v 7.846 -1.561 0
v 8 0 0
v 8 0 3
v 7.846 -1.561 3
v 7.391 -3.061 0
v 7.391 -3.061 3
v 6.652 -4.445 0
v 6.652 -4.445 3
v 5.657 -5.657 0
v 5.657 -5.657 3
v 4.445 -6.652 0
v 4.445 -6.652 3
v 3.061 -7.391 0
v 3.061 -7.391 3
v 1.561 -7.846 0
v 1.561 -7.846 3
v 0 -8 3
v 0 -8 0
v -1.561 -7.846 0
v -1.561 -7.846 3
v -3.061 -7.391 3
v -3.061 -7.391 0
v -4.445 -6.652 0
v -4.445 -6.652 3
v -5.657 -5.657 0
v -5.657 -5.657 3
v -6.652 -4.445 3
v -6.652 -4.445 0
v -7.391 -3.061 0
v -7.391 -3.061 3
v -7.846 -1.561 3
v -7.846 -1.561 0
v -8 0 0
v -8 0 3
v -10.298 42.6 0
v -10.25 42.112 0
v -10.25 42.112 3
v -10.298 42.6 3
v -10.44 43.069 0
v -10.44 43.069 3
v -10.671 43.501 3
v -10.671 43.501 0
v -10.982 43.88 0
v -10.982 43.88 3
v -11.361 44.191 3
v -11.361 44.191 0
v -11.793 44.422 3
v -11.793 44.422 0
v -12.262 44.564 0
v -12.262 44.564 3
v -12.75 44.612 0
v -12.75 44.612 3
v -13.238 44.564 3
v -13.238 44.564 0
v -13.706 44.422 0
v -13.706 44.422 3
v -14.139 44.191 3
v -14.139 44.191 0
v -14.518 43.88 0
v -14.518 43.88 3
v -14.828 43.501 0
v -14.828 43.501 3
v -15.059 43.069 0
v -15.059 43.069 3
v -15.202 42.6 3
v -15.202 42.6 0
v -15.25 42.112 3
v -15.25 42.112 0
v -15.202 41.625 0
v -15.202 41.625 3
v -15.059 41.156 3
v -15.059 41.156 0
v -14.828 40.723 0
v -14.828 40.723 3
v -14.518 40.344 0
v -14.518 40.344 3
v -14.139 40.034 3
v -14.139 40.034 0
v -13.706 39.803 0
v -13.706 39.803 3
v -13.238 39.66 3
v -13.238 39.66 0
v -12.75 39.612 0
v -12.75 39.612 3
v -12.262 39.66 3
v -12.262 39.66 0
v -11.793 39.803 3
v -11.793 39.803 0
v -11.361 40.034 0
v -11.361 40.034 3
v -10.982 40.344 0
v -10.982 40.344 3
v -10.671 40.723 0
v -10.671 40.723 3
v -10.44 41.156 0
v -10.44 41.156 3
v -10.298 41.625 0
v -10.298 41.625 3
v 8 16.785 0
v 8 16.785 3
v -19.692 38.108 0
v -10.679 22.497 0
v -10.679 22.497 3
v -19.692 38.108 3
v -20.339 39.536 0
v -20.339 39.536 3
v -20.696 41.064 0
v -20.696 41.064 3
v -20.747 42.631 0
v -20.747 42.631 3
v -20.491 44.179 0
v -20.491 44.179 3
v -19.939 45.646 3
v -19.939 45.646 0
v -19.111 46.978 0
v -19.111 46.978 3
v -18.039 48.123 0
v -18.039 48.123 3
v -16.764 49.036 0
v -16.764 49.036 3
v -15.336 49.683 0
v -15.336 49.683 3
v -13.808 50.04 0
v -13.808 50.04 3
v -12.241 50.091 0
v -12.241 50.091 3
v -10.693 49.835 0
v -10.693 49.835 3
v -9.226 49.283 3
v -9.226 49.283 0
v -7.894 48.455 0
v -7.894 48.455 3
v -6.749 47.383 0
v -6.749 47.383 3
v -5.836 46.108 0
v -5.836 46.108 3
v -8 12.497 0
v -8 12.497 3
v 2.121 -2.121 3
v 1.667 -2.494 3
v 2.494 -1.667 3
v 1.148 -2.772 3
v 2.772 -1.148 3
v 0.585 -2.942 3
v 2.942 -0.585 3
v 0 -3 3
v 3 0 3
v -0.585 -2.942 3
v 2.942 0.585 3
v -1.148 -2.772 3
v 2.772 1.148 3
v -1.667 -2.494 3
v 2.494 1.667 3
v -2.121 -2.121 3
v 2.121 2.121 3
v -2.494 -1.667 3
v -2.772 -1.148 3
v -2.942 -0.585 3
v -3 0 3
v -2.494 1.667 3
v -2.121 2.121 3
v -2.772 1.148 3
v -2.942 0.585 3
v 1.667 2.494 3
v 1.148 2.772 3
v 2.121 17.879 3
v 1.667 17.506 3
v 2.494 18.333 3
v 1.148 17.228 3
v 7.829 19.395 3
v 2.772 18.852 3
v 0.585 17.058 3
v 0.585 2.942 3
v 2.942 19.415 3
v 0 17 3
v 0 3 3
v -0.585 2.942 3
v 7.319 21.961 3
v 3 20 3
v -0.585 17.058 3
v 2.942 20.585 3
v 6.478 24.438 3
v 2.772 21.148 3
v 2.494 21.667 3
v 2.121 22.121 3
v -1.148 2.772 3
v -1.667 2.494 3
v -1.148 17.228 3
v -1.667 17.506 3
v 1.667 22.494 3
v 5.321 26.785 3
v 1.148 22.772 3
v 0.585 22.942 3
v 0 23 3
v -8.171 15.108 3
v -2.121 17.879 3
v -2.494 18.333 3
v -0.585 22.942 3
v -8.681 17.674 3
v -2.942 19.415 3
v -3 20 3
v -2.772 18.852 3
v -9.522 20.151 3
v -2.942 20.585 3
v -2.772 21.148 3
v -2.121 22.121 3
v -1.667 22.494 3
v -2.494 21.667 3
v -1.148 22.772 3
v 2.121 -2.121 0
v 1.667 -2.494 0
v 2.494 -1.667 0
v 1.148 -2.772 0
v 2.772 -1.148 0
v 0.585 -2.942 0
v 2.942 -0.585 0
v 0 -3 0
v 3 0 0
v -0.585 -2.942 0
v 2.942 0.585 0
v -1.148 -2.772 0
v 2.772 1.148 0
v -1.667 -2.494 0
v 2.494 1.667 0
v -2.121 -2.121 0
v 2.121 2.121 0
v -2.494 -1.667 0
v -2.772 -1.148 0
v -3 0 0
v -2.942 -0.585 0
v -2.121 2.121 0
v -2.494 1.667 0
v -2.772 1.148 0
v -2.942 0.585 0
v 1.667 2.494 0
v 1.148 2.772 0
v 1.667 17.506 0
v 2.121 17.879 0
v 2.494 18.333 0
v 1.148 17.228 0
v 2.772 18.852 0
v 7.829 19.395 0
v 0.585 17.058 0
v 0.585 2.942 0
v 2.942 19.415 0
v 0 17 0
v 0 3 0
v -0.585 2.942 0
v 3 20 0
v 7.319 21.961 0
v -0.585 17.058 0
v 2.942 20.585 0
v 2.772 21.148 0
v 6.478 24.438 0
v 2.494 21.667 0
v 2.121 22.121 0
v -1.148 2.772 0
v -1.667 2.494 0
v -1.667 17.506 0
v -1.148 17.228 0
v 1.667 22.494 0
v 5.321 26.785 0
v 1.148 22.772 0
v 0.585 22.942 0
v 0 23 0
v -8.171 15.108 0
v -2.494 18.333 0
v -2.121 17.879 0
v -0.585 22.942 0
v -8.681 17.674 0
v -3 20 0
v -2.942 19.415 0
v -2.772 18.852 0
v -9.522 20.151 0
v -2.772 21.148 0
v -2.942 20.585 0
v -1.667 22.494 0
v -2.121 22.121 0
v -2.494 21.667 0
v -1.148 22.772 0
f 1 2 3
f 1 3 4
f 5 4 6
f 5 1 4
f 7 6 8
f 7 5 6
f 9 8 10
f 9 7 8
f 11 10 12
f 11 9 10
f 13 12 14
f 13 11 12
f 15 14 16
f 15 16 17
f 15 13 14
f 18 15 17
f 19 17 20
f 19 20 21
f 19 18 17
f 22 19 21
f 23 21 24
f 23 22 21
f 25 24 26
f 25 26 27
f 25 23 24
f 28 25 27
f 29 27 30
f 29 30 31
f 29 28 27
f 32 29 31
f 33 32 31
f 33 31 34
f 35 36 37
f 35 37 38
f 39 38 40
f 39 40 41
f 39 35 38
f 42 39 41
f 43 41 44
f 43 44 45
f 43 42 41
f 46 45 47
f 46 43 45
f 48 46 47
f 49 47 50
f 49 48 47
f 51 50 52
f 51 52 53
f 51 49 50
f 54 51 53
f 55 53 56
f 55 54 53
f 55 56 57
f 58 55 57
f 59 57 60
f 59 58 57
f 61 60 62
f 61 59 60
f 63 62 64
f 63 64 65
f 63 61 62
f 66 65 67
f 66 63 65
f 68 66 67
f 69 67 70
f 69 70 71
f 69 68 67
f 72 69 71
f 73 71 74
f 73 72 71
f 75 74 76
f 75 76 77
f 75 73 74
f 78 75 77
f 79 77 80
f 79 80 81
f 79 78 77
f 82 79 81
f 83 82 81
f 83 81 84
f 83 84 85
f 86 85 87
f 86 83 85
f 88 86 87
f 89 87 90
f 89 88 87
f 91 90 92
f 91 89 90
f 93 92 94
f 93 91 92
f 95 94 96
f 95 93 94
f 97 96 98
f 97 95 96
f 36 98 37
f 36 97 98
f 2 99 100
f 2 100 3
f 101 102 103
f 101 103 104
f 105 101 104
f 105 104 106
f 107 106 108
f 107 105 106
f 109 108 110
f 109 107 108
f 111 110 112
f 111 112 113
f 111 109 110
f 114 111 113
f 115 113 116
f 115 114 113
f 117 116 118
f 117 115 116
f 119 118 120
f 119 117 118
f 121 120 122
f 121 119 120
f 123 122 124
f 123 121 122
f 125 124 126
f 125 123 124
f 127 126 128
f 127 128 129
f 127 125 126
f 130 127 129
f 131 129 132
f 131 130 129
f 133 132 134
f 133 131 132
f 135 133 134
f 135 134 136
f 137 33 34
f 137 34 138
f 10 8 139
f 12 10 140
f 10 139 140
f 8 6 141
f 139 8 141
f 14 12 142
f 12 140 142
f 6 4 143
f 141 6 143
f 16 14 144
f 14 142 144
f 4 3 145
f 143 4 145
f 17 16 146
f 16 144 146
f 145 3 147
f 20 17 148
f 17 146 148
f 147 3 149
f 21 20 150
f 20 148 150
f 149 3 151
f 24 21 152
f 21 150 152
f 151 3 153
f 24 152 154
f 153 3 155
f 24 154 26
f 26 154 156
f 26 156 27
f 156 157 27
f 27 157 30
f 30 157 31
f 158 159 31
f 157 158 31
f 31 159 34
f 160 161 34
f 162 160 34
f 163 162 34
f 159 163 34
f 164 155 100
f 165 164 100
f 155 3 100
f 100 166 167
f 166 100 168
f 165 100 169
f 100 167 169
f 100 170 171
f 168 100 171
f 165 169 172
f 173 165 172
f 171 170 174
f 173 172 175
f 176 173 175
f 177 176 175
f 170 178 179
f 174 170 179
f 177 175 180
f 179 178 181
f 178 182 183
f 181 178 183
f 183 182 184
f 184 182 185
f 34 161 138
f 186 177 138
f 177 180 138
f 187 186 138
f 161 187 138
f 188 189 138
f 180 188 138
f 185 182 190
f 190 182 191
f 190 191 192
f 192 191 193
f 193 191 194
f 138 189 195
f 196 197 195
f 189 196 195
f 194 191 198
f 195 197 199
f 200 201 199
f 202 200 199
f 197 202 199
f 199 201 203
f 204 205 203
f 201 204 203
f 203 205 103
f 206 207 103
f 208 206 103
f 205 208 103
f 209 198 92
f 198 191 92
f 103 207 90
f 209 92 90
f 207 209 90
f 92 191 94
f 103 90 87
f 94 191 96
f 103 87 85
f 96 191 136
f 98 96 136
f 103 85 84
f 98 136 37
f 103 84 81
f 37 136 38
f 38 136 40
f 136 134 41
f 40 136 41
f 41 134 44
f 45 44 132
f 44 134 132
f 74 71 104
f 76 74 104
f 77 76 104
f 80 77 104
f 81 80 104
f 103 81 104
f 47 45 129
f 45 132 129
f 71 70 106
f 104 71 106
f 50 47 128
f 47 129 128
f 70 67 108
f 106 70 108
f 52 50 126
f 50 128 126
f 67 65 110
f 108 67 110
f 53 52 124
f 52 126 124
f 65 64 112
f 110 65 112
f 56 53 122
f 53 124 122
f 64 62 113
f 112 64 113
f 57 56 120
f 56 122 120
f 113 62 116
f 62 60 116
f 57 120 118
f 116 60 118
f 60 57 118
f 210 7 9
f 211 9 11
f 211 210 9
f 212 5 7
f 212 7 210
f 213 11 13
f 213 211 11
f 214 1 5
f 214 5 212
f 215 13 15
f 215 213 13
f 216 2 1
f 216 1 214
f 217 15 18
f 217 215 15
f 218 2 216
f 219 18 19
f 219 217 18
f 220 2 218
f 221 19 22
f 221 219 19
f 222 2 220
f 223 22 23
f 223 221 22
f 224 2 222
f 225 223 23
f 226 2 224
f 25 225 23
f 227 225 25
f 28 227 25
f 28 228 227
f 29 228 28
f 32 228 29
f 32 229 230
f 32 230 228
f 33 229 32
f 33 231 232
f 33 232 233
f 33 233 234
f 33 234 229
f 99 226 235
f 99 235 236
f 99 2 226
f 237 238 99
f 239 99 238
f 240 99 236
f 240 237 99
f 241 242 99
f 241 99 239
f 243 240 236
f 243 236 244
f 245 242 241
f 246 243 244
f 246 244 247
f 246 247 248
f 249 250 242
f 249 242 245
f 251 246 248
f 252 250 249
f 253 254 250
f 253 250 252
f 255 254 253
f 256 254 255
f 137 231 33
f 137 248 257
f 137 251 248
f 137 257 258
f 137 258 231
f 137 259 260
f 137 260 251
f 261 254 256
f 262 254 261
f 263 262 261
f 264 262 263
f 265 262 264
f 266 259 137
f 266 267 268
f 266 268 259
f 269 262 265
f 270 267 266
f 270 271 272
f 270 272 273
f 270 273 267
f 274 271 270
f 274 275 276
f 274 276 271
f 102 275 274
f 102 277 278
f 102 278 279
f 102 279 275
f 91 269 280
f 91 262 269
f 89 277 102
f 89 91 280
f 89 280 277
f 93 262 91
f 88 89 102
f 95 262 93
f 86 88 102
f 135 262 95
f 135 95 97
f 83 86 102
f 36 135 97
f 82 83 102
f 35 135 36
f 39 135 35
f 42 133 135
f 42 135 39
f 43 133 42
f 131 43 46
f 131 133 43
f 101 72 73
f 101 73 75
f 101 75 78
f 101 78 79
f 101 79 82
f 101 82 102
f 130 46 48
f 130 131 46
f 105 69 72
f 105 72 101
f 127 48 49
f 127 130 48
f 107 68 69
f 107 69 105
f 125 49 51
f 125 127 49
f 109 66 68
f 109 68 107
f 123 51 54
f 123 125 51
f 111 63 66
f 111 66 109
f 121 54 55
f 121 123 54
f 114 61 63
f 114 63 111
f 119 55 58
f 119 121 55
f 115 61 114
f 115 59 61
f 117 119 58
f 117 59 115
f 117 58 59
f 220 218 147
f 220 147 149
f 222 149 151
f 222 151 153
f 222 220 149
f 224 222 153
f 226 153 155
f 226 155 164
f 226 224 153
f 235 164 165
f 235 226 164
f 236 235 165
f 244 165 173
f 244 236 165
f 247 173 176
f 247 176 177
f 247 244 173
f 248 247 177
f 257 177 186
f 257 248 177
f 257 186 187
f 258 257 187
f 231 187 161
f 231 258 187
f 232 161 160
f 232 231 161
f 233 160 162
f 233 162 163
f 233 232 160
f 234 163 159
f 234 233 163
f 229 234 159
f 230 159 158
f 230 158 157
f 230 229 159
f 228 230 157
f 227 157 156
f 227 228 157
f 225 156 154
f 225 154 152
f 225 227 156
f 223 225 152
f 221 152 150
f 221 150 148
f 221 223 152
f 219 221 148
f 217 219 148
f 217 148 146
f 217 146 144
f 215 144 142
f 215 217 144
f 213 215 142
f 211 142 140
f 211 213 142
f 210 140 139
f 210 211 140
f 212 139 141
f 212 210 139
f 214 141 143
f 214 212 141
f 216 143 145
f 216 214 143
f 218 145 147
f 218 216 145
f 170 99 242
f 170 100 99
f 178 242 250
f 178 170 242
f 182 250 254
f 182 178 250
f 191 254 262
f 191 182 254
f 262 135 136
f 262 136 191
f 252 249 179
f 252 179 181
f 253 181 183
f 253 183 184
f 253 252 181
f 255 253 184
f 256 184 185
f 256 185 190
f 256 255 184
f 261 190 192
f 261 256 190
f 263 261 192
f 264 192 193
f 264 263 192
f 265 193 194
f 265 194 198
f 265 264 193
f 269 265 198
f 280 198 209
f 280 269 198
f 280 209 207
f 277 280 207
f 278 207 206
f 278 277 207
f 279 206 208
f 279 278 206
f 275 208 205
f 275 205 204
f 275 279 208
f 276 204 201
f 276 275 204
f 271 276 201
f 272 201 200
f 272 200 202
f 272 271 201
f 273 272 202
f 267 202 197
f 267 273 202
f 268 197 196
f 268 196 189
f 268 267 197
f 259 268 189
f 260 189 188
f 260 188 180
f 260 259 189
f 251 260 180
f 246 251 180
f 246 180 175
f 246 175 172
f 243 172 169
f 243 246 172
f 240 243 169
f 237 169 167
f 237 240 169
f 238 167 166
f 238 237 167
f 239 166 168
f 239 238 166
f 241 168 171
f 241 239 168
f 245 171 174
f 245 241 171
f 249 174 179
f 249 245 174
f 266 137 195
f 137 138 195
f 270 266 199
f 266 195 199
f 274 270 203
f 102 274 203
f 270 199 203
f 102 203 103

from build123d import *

# Parameters (mm, degrees)
SKETCH1_R           = 3
SKETCH1_R_2         = 2.5
BOSS_EXTRUDE1_DEPTH = 3
FILLET1_R           = 20


with BuildPart() as part:
    # Sketch1 → Boss-Extrude1 (new body)
    with BuildSketch(Plane.XY):
        with BuildLine():
            Line((-8, 0), (-8, 17.856406461))
            Line((-8, 17.856406461), (-19.692234478, 38.107950631))
            ThreePointArc((-19.692234478, 38.107950631), (-16.764031248, 49.036153861), (-5.835828018, 46.107950631))
            Line((-5.835828018, 46.107950631), (8, 22.143593539))
            Line((8, 22.143593539), (8, 0))
            ThreePointArc((8, 0), (0, -8), (-8, 0))
        make_face()
        Circle(SKETCH1_R, mode=Mode.SUBTRACT)
        with Locations((0, 20)):
            Circle(SKETCH1_R, mode=Mode.SUBTRACT)
        with Locations((-12.749783974, 42.112266724)):
            Circle(SKETCH1_R_2, mode=Mode.SUBTRACT)
    extrude(amount=BOSS_EXTRUDE1_DEPTH)

    # Fillet1
    fillet1_edges = [part.edges().sort_by_distance(p)[0] for p in [
        (-8, 17.856406461, 1.5),
        (8, 22.143593539, 1.5),
    ]]
    fillet(fillet1_edges, radius=FILLET1_R)


solid = part.part
